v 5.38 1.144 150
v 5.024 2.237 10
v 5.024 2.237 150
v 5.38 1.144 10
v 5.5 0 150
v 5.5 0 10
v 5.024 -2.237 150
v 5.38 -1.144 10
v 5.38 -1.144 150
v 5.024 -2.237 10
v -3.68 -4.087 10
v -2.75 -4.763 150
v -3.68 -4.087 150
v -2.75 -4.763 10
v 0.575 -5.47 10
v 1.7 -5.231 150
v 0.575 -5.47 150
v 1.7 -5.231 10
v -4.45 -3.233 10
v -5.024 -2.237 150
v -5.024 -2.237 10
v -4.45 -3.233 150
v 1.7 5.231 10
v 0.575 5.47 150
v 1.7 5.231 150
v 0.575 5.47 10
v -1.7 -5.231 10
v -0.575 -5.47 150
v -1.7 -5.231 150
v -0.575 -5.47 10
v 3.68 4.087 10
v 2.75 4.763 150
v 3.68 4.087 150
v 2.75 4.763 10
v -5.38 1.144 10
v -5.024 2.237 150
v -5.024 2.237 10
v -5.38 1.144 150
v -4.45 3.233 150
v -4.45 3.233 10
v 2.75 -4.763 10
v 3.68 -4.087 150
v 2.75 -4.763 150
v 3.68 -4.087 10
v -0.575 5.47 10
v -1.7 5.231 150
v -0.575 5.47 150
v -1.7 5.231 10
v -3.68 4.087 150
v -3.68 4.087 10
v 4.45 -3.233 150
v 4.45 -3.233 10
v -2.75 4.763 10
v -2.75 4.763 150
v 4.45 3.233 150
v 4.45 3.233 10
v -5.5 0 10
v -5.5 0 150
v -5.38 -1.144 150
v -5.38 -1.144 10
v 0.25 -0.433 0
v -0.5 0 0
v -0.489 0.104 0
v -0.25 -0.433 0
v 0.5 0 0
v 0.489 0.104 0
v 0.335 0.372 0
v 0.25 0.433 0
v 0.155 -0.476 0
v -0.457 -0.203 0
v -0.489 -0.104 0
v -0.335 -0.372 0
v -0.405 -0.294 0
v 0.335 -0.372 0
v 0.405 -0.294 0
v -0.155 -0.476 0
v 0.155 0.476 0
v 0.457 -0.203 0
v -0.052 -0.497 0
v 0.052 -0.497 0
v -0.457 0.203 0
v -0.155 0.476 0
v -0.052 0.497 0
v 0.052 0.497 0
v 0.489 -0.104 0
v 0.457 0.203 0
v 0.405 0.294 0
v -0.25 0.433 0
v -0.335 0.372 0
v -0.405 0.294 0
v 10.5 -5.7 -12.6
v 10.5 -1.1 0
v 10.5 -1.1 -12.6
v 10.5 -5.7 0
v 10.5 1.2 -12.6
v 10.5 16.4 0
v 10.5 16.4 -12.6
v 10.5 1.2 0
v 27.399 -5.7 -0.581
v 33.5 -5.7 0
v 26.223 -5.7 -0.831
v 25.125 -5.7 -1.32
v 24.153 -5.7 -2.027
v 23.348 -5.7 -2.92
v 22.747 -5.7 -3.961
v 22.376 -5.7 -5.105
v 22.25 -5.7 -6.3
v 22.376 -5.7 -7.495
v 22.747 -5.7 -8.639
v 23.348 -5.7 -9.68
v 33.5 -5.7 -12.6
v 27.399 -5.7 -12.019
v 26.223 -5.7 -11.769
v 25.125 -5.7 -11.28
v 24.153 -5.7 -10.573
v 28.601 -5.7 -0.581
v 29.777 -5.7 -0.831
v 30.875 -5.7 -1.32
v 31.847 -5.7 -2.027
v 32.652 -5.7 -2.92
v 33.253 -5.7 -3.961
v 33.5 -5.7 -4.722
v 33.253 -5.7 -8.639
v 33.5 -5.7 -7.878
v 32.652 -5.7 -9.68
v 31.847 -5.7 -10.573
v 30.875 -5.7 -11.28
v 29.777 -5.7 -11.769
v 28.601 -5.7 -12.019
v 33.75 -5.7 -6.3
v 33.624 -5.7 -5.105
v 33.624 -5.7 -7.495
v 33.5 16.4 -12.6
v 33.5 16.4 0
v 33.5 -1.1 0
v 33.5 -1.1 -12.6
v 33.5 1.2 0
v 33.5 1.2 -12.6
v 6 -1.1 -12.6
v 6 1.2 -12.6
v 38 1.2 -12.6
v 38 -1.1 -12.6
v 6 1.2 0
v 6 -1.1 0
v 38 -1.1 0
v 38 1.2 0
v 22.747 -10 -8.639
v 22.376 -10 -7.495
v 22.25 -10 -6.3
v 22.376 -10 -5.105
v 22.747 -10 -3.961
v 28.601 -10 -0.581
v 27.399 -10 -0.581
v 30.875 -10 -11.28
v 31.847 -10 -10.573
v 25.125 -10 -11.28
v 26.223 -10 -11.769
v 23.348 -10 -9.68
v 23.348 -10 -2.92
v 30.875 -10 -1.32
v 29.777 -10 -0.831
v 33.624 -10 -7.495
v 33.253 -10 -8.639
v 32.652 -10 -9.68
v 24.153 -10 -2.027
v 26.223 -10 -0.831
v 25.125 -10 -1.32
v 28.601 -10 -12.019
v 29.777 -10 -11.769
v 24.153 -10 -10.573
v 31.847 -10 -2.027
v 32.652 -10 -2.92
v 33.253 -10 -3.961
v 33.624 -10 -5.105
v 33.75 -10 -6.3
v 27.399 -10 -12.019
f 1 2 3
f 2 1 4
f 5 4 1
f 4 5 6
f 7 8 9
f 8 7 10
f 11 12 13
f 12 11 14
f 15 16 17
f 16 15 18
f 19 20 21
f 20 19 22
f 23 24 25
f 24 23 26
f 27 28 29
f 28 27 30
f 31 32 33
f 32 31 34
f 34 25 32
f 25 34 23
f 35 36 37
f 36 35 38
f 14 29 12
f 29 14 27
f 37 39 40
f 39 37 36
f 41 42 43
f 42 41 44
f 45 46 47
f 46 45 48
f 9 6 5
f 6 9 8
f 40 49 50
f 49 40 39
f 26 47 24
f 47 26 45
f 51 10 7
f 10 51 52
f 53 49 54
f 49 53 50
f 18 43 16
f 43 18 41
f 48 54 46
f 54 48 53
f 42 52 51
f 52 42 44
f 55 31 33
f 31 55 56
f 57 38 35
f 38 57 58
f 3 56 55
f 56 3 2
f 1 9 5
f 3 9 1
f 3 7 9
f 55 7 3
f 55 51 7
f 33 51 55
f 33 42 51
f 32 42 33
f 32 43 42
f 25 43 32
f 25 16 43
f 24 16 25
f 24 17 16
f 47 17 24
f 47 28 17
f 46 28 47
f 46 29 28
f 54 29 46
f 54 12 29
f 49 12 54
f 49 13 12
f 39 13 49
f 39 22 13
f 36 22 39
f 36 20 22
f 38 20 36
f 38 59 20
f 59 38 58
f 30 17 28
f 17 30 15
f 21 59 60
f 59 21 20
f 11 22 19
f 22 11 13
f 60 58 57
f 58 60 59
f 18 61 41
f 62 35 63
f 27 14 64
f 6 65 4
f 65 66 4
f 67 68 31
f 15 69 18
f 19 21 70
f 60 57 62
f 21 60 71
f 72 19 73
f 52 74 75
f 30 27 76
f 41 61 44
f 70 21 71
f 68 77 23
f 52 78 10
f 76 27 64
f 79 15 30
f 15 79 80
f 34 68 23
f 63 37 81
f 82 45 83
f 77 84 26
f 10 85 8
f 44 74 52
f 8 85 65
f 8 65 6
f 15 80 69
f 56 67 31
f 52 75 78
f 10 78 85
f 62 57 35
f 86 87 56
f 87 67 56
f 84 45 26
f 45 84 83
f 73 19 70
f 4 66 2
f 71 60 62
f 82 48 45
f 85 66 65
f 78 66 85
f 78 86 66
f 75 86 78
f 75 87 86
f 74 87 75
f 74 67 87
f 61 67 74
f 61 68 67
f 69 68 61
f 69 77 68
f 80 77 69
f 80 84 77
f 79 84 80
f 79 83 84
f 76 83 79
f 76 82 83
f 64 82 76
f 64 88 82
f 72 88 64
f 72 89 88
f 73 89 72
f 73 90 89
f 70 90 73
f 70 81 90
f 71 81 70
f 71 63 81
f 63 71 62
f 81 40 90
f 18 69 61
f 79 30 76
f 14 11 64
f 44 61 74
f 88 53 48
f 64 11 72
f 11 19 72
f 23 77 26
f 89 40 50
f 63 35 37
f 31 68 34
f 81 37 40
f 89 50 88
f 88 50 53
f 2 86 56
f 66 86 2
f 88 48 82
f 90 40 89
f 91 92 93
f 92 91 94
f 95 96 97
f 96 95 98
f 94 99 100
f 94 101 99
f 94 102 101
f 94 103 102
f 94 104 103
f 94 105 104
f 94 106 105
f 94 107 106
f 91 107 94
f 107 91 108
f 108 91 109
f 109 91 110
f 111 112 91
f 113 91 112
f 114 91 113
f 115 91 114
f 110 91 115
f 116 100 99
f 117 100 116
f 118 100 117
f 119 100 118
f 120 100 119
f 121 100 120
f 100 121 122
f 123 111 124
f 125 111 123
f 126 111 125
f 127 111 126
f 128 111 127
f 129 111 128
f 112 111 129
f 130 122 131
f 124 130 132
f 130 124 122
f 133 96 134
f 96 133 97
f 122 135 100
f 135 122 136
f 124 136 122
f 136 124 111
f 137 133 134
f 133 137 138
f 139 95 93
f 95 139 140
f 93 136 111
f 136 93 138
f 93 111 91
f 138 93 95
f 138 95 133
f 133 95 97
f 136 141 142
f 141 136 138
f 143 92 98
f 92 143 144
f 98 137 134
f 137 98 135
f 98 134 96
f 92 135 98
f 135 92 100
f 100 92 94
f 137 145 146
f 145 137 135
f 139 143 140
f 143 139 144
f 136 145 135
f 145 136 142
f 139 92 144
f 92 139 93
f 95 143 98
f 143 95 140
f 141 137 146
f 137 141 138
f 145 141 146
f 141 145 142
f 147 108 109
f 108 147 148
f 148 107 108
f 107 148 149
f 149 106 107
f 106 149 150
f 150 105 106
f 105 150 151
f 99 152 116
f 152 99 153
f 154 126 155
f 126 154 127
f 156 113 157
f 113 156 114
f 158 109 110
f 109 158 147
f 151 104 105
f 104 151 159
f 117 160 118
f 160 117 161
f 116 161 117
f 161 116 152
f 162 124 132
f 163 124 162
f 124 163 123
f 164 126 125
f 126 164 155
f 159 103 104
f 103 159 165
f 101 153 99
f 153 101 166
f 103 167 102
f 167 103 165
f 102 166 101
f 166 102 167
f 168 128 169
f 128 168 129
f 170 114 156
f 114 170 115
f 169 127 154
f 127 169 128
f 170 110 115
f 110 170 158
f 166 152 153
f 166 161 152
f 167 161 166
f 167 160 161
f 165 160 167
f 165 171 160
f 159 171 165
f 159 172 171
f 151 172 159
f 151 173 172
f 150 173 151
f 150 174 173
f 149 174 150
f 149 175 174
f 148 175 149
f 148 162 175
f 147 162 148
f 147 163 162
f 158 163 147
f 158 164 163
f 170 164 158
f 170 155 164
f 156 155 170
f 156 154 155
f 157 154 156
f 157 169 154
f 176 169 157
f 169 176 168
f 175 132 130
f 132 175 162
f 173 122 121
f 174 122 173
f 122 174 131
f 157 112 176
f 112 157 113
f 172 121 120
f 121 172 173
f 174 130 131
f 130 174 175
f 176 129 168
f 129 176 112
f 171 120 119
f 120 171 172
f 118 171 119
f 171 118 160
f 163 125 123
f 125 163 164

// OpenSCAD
// Pen holder
// Uses bushings and a fitting rod from an old CD-Rom drive

//use </usr/share/openscad/MCAD/servos.scad>

EPS = 0.01;
$fs = 0.2;

// I use plywood
BoardThickness = 6;

YDistanceOfPenTipToVerticalEnd = 52;
ServoLiftHeight = 18;

PenDiameter = 11;
PenDipLength = 10;
PenLength = PenDipLength+130;

// Bearing
RodDiameter = 3;
RodLength = 75;
BushingDiameter = 4.5;
BushingLength = 3;

// Pen fixing
ThicknessOfJoinWithSlider = 10;
ScrewDiameter = 3;
ScrewNutY = 5.5;
ScrewNutX = 2.5;
MaterialArroundPenHole = 4;
MaterialNeededForScrew = 5;

ServoY = 12.6;

// Colors
Aluminum = [0.77, 0.77, 0.8];
BlackPaint = [0.2, 0.2, 0.2];
BrightYellow = [1, 1, 0];
Transparent = [0.3, 0.3, 1, 0.8];


module pen() {
    union() {
        translate([0,0,PenDipLength]) color(BlackPaint) cylinder(h = PenLength, r = PenDiameter/2);
        color(BrightYellow) cylinder(h = PenDipLength, r1 = 0.5, r2 = PenDiameter/2);
    }
}


module penSlider() {
    difference() {
      union() {
        linear_extrude(convexity = 10, center = false, height=BoardThickness)
          import(file = "penSlider.dxf", layer = "servoSupport-outer-cut-full");
        translate([0,0,BoardThickness])
          linear_extrude(convexity = 10, center = false, height=2*BoardThickness)
            import(file = "penSlider.dxf", layer = "outer-cut-full");
      }
      translate([0,0,-EPS])
        linear_extrude(convexity = 10, center = false, height=3*BoardThickness+2*EPS)
          import(file = "penSlider.dxf", layer = "inner-cut-full");

      translate([0,0,-EPS])
        linear_extrude(convexity = 10, center = false, height=3.6)
          import(file = "penSlider.dxf", layer = "inner-cut-3.6mm");

      translate([0,0,3*BoardThickness-3.6+EPS])
        linear_extrude(convexity = 10, center = false, height=3.6)
          import(file = "penSlider.dxf", layer = "inner-cut-3.6mm");

      // Hole for Screw
      translate([-19-PenDiameter/2,0,BoardThickness*1.5]) rotate(a = [0,90,0]) 
          cylinder(h = 20, r = ScrewDiameter/2);
    }
}

module servo(angle) {
    translate([0,0,-28.4]) {  
      union() {
        translate([-5.5,-6.3,0]) {
            cube(size=[23,ServoY,22.1]);
            translate([-4.5,0,15.2]) cube(size=[32,12.6,2.3]);
        }
        translate([0,0,22.1]) cylinder(r=5.75, h=4.3);
      }

      color(Transparent) rotate(a = [0,0,-angle]) translate([0,-20,26.4])
        linear_extrude(convexity = 10, center = false, height=2)
          import(file = "penSlider.dxf", layer = "servoArm");
    }
}

module horizontalArm() {
    difference() {
        linear_extrude(convexity = 10, center = false, height=BoardThickness)
          import(file = "penSlider.dxf", layer = "horizontal-outer-cut-full");
      translate([0,0,-EPS]) linear_extrude(convexity = 10, center = false, height=BoardThickness+2*EPS)
          import(file = "penSlider.dxf", layer = "horizontal-inner-cut-full");
    }
}

pen();
translate([0,0,BoardThickness]) penSlider();
color(Aluminum) horizontalArm();

translate ([28,-12,-ServoY/2]) rotate(a=[90,180,0]) servo(17);
